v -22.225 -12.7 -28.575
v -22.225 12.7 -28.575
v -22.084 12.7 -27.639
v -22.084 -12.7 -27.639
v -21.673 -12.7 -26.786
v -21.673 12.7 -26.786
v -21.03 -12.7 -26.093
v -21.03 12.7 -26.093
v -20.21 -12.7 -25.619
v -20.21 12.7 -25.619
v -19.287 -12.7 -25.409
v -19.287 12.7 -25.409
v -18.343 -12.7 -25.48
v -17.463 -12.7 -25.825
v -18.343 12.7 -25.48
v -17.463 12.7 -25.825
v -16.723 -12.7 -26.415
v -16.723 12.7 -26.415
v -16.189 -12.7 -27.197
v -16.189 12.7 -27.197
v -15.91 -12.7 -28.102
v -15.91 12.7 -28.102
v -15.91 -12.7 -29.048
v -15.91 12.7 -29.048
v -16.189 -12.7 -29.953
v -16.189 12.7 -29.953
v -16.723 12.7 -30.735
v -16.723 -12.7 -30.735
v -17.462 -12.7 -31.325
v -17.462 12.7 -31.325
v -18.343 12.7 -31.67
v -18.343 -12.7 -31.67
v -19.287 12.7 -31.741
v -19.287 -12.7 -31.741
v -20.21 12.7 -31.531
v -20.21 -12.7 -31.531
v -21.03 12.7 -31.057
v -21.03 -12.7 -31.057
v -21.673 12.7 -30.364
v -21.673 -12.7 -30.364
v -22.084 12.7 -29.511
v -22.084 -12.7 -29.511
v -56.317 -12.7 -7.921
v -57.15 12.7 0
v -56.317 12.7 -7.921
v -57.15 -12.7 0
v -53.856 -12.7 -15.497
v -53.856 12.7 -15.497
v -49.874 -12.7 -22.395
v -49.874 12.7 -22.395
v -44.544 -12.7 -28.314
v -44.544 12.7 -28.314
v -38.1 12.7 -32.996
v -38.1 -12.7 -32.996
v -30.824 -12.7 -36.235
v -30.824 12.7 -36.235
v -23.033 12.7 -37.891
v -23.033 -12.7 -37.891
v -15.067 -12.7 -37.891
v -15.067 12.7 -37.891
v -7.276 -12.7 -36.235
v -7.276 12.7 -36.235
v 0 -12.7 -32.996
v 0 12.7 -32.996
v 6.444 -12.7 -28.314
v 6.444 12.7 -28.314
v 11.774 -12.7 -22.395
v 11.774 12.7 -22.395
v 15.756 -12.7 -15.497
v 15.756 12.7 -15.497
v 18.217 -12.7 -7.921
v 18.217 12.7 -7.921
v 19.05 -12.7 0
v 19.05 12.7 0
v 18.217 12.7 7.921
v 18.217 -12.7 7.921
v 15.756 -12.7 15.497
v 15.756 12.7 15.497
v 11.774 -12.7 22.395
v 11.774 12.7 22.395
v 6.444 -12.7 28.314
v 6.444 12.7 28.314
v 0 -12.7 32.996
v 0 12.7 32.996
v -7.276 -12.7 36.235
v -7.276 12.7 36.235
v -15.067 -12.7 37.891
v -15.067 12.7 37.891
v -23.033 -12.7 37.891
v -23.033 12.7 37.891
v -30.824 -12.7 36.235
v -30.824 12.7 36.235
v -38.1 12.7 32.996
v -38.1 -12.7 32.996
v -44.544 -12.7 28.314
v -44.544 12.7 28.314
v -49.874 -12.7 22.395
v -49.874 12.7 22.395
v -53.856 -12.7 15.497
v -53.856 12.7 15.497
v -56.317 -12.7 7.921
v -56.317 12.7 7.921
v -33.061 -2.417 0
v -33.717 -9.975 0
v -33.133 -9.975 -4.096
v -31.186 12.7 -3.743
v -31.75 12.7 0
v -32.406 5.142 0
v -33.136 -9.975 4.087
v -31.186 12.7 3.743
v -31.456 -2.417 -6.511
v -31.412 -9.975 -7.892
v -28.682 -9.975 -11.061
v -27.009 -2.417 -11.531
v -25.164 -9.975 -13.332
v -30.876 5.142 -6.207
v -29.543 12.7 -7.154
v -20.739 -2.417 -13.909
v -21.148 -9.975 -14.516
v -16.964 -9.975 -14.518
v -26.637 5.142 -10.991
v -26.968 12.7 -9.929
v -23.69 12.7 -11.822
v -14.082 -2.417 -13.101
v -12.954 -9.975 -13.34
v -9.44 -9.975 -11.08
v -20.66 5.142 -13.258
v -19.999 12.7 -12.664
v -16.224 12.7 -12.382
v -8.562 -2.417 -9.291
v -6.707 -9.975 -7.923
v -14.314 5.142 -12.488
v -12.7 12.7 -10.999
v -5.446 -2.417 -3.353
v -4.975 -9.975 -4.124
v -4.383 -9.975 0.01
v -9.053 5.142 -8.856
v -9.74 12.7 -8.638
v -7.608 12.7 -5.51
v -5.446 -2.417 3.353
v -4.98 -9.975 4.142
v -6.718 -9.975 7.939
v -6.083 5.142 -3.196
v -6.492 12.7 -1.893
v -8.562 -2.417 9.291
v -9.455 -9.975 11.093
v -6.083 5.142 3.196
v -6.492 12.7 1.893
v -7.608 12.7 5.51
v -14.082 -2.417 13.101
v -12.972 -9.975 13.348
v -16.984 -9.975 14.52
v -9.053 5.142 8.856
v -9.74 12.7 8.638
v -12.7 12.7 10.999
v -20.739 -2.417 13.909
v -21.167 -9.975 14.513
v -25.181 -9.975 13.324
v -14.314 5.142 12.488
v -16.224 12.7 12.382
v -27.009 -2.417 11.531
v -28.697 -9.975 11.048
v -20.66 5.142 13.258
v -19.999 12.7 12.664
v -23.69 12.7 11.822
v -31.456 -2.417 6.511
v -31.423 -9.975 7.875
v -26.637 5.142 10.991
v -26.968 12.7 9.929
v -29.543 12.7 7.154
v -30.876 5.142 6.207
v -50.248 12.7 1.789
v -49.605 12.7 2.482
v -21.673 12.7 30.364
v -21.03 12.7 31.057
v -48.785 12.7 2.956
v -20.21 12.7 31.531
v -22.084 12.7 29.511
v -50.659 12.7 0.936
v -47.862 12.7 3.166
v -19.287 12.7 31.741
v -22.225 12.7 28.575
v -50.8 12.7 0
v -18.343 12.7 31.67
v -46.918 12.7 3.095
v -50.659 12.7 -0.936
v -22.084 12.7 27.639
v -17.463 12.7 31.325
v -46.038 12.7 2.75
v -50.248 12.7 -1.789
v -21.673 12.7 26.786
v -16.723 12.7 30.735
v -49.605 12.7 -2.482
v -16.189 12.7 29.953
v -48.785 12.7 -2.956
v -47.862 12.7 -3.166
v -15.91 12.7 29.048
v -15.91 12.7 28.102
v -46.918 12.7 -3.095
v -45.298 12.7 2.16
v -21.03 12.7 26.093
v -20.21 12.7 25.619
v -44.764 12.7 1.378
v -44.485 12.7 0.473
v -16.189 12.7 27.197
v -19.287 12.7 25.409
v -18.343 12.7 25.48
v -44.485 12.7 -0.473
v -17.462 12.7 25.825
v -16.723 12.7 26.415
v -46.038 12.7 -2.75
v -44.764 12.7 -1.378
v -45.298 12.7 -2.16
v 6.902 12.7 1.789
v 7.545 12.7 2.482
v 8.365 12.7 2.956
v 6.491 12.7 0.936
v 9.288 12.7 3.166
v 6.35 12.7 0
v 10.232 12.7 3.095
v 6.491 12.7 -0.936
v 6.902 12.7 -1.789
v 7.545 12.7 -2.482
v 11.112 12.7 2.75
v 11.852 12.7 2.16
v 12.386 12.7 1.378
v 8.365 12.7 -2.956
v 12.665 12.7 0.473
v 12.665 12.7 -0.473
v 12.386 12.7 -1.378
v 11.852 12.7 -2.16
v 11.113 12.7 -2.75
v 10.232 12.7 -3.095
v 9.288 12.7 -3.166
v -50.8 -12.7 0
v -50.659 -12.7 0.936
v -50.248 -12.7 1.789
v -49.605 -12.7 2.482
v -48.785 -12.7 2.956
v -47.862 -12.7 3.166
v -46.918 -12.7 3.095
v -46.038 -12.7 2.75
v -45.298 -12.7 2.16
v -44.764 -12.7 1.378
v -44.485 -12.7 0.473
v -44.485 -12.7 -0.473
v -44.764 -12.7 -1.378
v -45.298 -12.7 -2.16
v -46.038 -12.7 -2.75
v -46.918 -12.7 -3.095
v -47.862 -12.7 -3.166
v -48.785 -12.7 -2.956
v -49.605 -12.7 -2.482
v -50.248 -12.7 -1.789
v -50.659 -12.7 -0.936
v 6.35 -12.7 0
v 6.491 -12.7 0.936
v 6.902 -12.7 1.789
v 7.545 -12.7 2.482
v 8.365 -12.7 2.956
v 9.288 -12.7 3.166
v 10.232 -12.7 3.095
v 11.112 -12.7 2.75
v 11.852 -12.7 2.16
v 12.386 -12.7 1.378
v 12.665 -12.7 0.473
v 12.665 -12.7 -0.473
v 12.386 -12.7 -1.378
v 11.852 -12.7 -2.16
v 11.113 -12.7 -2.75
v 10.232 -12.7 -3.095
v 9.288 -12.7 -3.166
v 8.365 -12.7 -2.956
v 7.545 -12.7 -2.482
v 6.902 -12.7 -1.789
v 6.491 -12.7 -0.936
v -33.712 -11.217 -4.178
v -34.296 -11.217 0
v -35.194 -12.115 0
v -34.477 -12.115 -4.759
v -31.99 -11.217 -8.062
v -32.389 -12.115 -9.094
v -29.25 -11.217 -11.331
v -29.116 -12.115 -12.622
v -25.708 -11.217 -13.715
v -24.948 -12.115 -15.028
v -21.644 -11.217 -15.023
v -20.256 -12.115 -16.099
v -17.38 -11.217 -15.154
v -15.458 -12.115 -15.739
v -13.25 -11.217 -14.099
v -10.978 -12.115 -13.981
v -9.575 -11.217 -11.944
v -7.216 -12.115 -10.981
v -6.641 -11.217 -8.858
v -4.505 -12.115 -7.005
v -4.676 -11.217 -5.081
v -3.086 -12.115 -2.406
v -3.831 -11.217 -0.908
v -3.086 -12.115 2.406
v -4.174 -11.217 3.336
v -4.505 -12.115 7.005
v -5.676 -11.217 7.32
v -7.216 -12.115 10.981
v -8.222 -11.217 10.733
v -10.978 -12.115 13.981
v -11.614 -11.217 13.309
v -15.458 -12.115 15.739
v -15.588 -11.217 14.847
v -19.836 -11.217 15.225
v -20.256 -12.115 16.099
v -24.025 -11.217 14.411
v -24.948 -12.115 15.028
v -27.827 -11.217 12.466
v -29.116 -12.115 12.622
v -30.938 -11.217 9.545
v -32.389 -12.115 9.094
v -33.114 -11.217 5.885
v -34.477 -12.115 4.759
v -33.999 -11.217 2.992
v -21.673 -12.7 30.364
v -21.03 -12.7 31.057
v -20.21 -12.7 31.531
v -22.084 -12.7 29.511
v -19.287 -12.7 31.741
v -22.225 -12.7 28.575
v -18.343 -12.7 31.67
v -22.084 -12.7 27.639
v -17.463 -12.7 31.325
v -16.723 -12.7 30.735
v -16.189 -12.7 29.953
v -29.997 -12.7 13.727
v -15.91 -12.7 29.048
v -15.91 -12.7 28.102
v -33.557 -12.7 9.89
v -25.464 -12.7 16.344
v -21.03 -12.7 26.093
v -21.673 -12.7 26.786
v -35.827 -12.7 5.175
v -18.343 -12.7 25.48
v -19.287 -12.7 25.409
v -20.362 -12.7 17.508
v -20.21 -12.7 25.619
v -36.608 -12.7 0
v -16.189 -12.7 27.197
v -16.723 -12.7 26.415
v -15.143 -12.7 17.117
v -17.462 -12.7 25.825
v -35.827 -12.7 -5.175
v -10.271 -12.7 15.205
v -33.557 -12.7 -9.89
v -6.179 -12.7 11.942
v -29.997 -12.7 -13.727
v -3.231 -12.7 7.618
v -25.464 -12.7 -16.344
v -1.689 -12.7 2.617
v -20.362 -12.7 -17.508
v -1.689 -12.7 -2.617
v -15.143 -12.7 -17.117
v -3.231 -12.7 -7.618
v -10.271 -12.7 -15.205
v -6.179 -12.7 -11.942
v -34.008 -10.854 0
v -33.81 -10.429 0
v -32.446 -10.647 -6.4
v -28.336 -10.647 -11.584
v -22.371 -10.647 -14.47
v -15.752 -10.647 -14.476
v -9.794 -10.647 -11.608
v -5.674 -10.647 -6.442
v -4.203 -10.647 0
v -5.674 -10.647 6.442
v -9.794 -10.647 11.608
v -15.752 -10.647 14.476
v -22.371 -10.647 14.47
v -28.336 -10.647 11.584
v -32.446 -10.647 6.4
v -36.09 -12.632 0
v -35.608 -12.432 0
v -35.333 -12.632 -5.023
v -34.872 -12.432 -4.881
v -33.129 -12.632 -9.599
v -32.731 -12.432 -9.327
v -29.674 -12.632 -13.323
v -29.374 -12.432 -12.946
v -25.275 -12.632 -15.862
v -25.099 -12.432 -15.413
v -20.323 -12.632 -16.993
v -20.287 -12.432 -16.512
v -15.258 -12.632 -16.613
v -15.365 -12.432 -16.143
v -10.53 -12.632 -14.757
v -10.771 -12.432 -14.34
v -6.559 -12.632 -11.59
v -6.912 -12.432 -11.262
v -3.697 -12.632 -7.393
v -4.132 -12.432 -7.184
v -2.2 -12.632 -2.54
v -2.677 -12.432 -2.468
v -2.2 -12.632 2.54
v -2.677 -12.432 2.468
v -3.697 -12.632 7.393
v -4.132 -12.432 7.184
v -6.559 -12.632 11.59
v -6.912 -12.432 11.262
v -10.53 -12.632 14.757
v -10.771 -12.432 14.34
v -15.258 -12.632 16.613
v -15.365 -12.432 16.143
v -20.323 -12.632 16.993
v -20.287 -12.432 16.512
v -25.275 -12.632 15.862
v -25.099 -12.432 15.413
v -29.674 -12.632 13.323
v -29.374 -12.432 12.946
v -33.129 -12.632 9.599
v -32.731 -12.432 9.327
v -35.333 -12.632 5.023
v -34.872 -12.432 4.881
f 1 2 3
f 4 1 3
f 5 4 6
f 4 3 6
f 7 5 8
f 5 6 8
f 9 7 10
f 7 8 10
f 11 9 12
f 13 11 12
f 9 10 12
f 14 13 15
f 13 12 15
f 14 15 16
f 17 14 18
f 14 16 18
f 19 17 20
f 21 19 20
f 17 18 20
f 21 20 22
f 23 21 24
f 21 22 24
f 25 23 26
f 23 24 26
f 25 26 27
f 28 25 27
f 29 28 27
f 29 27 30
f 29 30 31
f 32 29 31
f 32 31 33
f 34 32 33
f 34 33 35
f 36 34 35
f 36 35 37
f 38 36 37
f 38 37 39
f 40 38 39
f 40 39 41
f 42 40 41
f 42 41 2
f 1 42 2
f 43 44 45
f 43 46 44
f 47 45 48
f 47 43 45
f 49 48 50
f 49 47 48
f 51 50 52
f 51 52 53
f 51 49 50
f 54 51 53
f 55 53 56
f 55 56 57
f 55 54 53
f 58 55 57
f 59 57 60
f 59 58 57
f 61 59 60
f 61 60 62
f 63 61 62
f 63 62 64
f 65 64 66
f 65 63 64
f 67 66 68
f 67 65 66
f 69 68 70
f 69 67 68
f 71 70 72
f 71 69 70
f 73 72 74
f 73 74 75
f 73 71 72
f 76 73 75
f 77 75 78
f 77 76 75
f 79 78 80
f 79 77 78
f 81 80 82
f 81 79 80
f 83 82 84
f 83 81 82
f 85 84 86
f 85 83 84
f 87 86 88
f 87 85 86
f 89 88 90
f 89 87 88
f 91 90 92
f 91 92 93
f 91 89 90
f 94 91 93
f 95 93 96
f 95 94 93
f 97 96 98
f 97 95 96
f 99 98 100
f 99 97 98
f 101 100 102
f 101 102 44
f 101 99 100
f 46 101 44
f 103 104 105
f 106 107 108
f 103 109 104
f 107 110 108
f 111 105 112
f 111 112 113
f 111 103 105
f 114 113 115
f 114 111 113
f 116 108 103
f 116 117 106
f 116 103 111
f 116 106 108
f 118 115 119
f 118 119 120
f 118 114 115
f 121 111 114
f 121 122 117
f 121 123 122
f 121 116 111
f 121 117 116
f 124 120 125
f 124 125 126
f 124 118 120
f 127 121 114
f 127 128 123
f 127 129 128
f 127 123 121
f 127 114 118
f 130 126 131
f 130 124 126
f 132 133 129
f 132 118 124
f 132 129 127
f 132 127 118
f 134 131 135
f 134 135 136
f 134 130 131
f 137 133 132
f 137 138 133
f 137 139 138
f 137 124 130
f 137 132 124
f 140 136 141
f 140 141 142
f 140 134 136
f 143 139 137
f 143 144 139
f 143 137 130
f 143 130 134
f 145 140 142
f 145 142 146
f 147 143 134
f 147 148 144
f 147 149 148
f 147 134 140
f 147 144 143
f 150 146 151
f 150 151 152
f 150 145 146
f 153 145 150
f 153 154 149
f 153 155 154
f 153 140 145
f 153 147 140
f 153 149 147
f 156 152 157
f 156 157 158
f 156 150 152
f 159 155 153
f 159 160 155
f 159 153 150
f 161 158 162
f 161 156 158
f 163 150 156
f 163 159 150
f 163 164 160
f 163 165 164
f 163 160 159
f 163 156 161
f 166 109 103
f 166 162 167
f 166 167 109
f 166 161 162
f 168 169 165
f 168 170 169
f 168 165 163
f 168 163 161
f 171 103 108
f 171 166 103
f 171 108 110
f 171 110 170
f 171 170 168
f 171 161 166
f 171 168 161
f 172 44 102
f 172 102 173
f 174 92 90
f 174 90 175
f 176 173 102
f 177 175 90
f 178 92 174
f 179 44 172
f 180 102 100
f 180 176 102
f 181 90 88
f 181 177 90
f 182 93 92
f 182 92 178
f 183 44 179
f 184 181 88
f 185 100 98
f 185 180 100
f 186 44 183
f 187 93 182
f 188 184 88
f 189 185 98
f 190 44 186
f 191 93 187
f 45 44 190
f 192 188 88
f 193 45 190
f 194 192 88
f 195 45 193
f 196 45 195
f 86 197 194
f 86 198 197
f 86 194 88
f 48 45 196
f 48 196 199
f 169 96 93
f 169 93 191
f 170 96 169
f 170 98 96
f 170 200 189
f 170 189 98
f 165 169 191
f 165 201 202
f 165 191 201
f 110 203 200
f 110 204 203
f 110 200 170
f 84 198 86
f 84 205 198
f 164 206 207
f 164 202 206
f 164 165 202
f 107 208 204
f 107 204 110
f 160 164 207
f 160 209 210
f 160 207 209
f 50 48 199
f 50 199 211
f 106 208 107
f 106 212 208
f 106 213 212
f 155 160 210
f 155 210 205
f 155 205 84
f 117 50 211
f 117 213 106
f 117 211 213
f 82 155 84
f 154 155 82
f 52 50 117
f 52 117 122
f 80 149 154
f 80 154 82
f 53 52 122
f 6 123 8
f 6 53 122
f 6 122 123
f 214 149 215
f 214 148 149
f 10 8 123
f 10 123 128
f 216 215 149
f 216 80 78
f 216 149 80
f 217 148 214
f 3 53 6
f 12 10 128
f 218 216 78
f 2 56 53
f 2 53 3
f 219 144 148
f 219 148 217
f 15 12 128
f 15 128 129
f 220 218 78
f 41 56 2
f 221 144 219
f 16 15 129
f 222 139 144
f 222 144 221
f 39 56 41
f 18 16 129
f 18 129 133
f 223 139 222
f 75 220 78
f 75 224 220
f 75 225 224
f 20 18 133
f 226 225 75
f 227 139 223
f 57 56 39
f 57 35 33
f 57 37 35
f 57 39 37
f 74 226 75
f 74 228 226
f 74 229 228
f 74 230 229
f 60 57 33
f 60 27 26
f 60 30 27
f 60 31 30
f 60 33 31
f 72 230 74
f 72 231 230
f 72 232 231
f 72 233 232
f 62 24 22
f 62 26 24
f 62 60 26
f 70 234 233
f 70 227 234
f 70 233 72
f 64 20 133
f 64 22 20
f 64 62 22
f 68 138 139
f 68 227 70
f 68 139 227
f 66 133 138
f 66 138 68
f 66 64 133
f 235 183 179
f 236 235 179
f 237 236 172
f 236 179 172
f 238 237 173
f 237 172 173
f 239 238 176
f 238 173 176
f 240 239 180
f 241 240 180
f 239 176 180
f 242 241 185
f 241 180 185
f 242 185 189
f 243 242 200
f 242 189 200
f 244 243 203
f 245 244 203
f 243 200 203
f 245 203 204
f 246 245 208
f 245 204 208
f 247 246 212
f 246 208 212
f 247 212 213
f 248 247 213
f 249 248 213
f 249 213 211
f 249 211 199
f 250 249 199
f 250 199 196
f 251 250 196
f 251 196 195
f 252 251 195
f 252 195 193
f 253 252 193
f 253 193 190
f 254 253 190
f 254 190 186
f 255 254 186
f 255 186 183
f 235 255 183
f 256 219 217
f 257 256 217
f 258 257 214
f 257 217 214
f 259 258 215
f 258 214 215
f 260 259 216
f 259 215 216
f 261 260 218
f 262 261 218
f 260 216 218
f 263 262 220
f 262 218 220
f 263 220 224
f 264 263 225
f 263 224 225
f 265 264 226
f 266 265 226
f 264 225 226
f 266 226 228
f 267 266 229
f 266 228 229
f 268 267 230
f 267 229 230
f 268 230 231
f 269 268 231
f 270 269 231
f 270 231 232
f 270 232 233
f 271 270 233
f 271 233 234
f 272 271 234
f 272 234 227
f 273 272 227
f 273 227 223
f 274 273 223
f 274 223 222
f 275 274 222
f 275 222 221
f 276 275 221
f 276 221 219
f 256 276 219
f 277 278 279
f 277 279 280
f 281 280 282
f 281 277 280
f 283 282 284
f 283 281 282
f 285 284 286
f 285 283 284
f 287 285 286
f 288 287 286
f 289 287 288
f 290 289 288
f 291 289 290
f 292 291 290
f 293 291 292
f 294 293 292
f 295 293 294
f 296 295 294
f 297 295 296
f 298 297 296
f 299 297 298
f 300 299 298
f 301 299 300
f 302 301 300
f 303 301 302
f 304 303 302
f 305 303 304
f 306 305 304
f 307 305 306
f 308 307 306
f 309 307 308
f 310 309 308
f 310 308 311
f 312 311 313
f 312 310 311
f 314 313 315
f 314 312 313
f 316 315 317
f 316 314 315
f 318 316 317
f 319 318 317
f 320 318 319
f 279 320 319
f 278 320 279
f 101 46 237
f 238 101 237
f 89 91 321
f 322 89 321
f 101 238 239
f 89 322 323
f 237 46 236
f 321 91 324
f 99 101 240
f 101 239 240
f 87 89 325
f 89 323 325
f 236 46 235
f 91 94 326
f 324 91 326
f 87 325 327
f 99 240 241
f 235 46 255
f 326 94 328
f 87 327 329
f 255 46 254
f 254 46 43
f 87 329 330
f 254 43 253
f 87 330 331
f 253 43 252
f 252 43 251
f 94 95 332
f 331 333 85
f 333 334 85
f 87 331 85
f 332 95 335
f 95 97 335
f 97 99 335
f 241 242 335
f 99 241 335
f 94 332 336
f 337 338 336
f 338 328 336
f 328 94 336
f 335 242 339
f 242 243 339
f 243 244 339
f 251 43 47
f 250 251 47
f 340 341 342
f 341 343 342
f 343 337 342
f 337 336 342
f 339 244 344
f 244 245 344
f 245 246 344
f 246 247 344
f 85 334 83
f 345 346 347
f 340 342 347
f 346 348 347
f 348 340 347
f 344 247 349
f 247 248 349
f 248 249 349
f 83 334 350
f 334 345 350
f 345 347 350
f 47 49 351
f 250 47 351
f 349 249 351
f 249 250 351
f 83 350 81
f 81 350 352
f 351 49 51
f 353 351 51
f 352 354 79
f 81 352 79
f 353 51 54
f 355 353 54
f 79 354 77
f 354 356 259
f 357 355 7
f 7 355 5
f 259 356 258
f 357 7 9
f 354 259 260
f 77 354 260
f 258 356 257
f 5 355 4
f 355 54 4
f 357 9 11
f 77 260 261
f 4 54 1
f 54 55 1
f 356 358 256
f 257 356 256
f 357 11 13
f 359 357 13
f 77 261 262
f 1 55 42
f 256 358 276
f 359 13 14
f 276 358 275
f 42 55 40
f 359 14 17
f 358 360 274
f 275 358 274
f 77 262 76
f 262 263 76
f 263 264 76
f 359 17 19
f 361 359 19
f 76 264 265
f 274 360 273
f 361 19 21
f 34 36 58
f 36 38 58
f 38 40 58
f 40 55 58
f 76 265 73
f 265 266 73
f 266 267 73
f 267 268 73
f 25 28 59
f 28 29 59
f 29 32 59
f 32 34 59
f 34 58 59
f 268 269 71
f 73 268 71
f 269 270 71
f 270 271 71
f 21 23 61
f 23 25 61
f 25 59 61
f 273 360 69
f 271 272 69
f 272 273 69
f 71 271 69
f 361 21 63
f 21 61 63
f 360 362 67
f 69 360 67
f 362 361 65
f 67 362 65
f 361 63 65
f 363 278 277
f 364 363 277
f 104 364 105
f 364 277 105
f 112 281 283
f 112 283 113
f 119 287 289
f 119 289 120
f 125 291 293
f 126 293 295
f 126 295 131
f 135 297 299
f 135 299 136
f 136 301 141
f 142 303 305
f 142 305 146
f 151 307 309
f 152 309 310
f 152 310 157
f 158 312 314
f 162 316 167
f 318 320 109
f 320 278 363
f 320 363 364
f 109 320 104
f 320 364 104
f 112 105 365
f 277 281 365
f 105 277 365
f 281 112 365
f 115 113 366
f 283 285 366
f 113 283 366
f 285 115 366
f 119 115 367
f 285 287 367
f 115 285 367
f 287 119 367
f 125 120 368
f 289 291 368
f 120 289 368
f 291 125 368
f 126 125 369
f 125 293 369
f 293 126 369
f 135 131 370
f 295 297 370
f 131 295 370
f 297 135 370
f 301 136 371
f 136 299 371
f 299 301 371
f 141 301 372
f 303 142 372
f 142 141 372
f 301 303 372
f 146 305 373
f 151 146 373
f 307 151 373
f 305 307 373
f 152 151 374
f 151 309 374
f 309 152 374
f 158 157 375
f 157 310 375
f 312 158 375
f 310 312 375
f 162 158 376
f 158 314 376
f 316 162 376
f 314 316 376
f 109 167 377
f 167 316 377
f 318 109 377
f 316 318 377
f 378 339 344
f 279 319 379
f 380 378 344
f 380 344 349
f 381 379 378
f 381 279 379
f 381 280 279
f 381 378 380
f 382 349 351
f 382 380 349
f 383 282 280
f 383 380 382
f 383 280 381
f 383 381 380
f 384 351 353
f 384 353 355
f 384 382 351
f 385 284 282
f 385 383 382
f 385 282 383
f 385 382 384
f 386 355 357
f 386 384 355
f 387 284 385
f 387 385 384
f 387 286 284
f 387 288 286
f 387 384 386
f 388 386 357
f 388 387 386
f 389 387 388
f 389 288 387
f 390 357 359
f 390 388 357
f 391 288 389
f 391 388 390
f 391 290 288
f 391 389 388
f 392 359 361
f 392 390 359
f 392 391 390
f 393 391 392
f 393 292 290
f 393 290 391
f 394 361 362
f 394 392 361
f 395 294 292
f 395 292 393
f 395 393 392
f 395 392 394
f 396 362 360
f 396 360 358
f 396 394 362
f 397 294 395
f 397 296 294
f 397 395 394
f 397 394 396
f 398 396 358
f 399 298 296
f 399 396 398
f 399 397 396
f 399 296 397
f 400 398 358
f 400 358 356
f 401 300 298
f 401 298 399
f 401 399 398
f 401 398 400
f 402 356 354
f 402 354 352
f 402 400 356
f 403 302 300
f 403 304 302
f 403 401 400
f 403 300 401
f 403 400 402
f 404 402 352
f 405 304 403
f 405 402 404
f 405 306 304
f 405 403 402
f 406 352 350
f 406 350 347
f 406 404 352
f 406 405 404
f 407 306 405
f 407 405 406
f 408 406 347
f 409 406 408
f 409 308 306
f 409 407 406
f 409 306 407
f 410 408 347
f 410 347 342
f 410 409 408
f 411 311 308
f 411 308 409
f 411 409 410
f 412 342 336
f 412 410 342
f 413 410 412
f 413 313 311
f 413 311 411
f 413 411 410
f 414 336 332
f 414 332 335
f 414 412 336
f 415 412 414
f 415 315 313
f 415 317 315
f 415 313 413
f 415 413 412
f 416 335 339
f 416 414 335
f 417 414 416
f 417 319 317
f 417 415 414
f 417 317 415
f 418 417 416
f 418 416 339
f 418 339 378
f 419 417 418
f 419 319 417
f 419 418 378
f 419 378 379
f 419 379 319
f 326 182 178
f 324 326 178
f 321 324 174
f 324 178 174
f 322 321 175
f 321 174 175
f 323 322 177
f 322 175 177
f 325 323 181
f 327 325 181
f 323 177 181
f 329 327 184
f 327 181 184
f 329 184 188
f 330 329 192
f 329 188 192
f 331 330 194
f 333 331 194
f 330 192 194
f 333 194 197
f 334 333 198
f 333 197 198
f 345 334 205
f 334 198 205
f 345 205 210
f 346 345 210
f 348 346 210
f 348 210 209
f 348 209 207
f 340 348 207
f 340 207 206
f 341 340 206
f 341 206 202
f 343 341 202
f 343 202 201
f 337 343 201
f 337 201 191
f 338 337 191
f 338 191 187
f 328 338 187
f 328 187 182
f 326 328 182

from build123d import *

# Parameters (mm, degrees)
FILLET1_R          = 2
SKETCH3_R          = 3.175
CUT_EXTRUDE1_DEPTH = 74.231772476


with BuildPart() as part:
    # Sketch2 → Revolve2 (revolve)
    with BuildSketch(Plane.XY, mode=Mode.PRIVATE) as revolve2_sk:
        Polygon((19.05, -12.7), (-2.29475363, -12.7), (-2.320408163, -12.7), (-4.320233699, -10.701915819), (-6.35, 12.7), (19.05, 12.7), align=None)
    revolve(revolve2_sk.sketch.rotate(Axis((-19.05, 12.7, 0), (0, -1, 0)), 180), axis=Axis((-19.05, 12.7, 0), (0, -1, 0)))

    # Fillet1
    fillet1_edges = [part.edges().sort_by_distance(p)[0] for p in [
        (-4.320233699, -10.701915819, 0),
        (-2.320408163, -12.7, 0),
    ]]
    fillet(fillet1_edges, radius=FILLET1_R)

    # Sketch3 → Cut-Extrude1 (cut, through all)
    with BuildSketch(Plane(origin=(0, 12.7, 0), x_dir=(1, 0, 0), z_dir=(0, 1, 0))):
        with Locations(Location((-19.05, 28.575, 0), (0, 0, 180))):
            Circle(SKETCH3_R)
        with Locations(Location((9.525, 0, 0), (0, 0, 180))):
            Circle(SKETCH3_R)
        with Locations(Location((-19.05, -28.575, 0), (0, 0, 180))):
            Circle(SKETCH3_R)
        with Locations(Location((-47.625, 0, 0), (0, 0, 180))):
            Circle(SKETCH3_R)
    extrude(amount=-CUT_EXTRUDE1_DEPTH, mode=Mode.SUBTRACT)


solid = part.part
